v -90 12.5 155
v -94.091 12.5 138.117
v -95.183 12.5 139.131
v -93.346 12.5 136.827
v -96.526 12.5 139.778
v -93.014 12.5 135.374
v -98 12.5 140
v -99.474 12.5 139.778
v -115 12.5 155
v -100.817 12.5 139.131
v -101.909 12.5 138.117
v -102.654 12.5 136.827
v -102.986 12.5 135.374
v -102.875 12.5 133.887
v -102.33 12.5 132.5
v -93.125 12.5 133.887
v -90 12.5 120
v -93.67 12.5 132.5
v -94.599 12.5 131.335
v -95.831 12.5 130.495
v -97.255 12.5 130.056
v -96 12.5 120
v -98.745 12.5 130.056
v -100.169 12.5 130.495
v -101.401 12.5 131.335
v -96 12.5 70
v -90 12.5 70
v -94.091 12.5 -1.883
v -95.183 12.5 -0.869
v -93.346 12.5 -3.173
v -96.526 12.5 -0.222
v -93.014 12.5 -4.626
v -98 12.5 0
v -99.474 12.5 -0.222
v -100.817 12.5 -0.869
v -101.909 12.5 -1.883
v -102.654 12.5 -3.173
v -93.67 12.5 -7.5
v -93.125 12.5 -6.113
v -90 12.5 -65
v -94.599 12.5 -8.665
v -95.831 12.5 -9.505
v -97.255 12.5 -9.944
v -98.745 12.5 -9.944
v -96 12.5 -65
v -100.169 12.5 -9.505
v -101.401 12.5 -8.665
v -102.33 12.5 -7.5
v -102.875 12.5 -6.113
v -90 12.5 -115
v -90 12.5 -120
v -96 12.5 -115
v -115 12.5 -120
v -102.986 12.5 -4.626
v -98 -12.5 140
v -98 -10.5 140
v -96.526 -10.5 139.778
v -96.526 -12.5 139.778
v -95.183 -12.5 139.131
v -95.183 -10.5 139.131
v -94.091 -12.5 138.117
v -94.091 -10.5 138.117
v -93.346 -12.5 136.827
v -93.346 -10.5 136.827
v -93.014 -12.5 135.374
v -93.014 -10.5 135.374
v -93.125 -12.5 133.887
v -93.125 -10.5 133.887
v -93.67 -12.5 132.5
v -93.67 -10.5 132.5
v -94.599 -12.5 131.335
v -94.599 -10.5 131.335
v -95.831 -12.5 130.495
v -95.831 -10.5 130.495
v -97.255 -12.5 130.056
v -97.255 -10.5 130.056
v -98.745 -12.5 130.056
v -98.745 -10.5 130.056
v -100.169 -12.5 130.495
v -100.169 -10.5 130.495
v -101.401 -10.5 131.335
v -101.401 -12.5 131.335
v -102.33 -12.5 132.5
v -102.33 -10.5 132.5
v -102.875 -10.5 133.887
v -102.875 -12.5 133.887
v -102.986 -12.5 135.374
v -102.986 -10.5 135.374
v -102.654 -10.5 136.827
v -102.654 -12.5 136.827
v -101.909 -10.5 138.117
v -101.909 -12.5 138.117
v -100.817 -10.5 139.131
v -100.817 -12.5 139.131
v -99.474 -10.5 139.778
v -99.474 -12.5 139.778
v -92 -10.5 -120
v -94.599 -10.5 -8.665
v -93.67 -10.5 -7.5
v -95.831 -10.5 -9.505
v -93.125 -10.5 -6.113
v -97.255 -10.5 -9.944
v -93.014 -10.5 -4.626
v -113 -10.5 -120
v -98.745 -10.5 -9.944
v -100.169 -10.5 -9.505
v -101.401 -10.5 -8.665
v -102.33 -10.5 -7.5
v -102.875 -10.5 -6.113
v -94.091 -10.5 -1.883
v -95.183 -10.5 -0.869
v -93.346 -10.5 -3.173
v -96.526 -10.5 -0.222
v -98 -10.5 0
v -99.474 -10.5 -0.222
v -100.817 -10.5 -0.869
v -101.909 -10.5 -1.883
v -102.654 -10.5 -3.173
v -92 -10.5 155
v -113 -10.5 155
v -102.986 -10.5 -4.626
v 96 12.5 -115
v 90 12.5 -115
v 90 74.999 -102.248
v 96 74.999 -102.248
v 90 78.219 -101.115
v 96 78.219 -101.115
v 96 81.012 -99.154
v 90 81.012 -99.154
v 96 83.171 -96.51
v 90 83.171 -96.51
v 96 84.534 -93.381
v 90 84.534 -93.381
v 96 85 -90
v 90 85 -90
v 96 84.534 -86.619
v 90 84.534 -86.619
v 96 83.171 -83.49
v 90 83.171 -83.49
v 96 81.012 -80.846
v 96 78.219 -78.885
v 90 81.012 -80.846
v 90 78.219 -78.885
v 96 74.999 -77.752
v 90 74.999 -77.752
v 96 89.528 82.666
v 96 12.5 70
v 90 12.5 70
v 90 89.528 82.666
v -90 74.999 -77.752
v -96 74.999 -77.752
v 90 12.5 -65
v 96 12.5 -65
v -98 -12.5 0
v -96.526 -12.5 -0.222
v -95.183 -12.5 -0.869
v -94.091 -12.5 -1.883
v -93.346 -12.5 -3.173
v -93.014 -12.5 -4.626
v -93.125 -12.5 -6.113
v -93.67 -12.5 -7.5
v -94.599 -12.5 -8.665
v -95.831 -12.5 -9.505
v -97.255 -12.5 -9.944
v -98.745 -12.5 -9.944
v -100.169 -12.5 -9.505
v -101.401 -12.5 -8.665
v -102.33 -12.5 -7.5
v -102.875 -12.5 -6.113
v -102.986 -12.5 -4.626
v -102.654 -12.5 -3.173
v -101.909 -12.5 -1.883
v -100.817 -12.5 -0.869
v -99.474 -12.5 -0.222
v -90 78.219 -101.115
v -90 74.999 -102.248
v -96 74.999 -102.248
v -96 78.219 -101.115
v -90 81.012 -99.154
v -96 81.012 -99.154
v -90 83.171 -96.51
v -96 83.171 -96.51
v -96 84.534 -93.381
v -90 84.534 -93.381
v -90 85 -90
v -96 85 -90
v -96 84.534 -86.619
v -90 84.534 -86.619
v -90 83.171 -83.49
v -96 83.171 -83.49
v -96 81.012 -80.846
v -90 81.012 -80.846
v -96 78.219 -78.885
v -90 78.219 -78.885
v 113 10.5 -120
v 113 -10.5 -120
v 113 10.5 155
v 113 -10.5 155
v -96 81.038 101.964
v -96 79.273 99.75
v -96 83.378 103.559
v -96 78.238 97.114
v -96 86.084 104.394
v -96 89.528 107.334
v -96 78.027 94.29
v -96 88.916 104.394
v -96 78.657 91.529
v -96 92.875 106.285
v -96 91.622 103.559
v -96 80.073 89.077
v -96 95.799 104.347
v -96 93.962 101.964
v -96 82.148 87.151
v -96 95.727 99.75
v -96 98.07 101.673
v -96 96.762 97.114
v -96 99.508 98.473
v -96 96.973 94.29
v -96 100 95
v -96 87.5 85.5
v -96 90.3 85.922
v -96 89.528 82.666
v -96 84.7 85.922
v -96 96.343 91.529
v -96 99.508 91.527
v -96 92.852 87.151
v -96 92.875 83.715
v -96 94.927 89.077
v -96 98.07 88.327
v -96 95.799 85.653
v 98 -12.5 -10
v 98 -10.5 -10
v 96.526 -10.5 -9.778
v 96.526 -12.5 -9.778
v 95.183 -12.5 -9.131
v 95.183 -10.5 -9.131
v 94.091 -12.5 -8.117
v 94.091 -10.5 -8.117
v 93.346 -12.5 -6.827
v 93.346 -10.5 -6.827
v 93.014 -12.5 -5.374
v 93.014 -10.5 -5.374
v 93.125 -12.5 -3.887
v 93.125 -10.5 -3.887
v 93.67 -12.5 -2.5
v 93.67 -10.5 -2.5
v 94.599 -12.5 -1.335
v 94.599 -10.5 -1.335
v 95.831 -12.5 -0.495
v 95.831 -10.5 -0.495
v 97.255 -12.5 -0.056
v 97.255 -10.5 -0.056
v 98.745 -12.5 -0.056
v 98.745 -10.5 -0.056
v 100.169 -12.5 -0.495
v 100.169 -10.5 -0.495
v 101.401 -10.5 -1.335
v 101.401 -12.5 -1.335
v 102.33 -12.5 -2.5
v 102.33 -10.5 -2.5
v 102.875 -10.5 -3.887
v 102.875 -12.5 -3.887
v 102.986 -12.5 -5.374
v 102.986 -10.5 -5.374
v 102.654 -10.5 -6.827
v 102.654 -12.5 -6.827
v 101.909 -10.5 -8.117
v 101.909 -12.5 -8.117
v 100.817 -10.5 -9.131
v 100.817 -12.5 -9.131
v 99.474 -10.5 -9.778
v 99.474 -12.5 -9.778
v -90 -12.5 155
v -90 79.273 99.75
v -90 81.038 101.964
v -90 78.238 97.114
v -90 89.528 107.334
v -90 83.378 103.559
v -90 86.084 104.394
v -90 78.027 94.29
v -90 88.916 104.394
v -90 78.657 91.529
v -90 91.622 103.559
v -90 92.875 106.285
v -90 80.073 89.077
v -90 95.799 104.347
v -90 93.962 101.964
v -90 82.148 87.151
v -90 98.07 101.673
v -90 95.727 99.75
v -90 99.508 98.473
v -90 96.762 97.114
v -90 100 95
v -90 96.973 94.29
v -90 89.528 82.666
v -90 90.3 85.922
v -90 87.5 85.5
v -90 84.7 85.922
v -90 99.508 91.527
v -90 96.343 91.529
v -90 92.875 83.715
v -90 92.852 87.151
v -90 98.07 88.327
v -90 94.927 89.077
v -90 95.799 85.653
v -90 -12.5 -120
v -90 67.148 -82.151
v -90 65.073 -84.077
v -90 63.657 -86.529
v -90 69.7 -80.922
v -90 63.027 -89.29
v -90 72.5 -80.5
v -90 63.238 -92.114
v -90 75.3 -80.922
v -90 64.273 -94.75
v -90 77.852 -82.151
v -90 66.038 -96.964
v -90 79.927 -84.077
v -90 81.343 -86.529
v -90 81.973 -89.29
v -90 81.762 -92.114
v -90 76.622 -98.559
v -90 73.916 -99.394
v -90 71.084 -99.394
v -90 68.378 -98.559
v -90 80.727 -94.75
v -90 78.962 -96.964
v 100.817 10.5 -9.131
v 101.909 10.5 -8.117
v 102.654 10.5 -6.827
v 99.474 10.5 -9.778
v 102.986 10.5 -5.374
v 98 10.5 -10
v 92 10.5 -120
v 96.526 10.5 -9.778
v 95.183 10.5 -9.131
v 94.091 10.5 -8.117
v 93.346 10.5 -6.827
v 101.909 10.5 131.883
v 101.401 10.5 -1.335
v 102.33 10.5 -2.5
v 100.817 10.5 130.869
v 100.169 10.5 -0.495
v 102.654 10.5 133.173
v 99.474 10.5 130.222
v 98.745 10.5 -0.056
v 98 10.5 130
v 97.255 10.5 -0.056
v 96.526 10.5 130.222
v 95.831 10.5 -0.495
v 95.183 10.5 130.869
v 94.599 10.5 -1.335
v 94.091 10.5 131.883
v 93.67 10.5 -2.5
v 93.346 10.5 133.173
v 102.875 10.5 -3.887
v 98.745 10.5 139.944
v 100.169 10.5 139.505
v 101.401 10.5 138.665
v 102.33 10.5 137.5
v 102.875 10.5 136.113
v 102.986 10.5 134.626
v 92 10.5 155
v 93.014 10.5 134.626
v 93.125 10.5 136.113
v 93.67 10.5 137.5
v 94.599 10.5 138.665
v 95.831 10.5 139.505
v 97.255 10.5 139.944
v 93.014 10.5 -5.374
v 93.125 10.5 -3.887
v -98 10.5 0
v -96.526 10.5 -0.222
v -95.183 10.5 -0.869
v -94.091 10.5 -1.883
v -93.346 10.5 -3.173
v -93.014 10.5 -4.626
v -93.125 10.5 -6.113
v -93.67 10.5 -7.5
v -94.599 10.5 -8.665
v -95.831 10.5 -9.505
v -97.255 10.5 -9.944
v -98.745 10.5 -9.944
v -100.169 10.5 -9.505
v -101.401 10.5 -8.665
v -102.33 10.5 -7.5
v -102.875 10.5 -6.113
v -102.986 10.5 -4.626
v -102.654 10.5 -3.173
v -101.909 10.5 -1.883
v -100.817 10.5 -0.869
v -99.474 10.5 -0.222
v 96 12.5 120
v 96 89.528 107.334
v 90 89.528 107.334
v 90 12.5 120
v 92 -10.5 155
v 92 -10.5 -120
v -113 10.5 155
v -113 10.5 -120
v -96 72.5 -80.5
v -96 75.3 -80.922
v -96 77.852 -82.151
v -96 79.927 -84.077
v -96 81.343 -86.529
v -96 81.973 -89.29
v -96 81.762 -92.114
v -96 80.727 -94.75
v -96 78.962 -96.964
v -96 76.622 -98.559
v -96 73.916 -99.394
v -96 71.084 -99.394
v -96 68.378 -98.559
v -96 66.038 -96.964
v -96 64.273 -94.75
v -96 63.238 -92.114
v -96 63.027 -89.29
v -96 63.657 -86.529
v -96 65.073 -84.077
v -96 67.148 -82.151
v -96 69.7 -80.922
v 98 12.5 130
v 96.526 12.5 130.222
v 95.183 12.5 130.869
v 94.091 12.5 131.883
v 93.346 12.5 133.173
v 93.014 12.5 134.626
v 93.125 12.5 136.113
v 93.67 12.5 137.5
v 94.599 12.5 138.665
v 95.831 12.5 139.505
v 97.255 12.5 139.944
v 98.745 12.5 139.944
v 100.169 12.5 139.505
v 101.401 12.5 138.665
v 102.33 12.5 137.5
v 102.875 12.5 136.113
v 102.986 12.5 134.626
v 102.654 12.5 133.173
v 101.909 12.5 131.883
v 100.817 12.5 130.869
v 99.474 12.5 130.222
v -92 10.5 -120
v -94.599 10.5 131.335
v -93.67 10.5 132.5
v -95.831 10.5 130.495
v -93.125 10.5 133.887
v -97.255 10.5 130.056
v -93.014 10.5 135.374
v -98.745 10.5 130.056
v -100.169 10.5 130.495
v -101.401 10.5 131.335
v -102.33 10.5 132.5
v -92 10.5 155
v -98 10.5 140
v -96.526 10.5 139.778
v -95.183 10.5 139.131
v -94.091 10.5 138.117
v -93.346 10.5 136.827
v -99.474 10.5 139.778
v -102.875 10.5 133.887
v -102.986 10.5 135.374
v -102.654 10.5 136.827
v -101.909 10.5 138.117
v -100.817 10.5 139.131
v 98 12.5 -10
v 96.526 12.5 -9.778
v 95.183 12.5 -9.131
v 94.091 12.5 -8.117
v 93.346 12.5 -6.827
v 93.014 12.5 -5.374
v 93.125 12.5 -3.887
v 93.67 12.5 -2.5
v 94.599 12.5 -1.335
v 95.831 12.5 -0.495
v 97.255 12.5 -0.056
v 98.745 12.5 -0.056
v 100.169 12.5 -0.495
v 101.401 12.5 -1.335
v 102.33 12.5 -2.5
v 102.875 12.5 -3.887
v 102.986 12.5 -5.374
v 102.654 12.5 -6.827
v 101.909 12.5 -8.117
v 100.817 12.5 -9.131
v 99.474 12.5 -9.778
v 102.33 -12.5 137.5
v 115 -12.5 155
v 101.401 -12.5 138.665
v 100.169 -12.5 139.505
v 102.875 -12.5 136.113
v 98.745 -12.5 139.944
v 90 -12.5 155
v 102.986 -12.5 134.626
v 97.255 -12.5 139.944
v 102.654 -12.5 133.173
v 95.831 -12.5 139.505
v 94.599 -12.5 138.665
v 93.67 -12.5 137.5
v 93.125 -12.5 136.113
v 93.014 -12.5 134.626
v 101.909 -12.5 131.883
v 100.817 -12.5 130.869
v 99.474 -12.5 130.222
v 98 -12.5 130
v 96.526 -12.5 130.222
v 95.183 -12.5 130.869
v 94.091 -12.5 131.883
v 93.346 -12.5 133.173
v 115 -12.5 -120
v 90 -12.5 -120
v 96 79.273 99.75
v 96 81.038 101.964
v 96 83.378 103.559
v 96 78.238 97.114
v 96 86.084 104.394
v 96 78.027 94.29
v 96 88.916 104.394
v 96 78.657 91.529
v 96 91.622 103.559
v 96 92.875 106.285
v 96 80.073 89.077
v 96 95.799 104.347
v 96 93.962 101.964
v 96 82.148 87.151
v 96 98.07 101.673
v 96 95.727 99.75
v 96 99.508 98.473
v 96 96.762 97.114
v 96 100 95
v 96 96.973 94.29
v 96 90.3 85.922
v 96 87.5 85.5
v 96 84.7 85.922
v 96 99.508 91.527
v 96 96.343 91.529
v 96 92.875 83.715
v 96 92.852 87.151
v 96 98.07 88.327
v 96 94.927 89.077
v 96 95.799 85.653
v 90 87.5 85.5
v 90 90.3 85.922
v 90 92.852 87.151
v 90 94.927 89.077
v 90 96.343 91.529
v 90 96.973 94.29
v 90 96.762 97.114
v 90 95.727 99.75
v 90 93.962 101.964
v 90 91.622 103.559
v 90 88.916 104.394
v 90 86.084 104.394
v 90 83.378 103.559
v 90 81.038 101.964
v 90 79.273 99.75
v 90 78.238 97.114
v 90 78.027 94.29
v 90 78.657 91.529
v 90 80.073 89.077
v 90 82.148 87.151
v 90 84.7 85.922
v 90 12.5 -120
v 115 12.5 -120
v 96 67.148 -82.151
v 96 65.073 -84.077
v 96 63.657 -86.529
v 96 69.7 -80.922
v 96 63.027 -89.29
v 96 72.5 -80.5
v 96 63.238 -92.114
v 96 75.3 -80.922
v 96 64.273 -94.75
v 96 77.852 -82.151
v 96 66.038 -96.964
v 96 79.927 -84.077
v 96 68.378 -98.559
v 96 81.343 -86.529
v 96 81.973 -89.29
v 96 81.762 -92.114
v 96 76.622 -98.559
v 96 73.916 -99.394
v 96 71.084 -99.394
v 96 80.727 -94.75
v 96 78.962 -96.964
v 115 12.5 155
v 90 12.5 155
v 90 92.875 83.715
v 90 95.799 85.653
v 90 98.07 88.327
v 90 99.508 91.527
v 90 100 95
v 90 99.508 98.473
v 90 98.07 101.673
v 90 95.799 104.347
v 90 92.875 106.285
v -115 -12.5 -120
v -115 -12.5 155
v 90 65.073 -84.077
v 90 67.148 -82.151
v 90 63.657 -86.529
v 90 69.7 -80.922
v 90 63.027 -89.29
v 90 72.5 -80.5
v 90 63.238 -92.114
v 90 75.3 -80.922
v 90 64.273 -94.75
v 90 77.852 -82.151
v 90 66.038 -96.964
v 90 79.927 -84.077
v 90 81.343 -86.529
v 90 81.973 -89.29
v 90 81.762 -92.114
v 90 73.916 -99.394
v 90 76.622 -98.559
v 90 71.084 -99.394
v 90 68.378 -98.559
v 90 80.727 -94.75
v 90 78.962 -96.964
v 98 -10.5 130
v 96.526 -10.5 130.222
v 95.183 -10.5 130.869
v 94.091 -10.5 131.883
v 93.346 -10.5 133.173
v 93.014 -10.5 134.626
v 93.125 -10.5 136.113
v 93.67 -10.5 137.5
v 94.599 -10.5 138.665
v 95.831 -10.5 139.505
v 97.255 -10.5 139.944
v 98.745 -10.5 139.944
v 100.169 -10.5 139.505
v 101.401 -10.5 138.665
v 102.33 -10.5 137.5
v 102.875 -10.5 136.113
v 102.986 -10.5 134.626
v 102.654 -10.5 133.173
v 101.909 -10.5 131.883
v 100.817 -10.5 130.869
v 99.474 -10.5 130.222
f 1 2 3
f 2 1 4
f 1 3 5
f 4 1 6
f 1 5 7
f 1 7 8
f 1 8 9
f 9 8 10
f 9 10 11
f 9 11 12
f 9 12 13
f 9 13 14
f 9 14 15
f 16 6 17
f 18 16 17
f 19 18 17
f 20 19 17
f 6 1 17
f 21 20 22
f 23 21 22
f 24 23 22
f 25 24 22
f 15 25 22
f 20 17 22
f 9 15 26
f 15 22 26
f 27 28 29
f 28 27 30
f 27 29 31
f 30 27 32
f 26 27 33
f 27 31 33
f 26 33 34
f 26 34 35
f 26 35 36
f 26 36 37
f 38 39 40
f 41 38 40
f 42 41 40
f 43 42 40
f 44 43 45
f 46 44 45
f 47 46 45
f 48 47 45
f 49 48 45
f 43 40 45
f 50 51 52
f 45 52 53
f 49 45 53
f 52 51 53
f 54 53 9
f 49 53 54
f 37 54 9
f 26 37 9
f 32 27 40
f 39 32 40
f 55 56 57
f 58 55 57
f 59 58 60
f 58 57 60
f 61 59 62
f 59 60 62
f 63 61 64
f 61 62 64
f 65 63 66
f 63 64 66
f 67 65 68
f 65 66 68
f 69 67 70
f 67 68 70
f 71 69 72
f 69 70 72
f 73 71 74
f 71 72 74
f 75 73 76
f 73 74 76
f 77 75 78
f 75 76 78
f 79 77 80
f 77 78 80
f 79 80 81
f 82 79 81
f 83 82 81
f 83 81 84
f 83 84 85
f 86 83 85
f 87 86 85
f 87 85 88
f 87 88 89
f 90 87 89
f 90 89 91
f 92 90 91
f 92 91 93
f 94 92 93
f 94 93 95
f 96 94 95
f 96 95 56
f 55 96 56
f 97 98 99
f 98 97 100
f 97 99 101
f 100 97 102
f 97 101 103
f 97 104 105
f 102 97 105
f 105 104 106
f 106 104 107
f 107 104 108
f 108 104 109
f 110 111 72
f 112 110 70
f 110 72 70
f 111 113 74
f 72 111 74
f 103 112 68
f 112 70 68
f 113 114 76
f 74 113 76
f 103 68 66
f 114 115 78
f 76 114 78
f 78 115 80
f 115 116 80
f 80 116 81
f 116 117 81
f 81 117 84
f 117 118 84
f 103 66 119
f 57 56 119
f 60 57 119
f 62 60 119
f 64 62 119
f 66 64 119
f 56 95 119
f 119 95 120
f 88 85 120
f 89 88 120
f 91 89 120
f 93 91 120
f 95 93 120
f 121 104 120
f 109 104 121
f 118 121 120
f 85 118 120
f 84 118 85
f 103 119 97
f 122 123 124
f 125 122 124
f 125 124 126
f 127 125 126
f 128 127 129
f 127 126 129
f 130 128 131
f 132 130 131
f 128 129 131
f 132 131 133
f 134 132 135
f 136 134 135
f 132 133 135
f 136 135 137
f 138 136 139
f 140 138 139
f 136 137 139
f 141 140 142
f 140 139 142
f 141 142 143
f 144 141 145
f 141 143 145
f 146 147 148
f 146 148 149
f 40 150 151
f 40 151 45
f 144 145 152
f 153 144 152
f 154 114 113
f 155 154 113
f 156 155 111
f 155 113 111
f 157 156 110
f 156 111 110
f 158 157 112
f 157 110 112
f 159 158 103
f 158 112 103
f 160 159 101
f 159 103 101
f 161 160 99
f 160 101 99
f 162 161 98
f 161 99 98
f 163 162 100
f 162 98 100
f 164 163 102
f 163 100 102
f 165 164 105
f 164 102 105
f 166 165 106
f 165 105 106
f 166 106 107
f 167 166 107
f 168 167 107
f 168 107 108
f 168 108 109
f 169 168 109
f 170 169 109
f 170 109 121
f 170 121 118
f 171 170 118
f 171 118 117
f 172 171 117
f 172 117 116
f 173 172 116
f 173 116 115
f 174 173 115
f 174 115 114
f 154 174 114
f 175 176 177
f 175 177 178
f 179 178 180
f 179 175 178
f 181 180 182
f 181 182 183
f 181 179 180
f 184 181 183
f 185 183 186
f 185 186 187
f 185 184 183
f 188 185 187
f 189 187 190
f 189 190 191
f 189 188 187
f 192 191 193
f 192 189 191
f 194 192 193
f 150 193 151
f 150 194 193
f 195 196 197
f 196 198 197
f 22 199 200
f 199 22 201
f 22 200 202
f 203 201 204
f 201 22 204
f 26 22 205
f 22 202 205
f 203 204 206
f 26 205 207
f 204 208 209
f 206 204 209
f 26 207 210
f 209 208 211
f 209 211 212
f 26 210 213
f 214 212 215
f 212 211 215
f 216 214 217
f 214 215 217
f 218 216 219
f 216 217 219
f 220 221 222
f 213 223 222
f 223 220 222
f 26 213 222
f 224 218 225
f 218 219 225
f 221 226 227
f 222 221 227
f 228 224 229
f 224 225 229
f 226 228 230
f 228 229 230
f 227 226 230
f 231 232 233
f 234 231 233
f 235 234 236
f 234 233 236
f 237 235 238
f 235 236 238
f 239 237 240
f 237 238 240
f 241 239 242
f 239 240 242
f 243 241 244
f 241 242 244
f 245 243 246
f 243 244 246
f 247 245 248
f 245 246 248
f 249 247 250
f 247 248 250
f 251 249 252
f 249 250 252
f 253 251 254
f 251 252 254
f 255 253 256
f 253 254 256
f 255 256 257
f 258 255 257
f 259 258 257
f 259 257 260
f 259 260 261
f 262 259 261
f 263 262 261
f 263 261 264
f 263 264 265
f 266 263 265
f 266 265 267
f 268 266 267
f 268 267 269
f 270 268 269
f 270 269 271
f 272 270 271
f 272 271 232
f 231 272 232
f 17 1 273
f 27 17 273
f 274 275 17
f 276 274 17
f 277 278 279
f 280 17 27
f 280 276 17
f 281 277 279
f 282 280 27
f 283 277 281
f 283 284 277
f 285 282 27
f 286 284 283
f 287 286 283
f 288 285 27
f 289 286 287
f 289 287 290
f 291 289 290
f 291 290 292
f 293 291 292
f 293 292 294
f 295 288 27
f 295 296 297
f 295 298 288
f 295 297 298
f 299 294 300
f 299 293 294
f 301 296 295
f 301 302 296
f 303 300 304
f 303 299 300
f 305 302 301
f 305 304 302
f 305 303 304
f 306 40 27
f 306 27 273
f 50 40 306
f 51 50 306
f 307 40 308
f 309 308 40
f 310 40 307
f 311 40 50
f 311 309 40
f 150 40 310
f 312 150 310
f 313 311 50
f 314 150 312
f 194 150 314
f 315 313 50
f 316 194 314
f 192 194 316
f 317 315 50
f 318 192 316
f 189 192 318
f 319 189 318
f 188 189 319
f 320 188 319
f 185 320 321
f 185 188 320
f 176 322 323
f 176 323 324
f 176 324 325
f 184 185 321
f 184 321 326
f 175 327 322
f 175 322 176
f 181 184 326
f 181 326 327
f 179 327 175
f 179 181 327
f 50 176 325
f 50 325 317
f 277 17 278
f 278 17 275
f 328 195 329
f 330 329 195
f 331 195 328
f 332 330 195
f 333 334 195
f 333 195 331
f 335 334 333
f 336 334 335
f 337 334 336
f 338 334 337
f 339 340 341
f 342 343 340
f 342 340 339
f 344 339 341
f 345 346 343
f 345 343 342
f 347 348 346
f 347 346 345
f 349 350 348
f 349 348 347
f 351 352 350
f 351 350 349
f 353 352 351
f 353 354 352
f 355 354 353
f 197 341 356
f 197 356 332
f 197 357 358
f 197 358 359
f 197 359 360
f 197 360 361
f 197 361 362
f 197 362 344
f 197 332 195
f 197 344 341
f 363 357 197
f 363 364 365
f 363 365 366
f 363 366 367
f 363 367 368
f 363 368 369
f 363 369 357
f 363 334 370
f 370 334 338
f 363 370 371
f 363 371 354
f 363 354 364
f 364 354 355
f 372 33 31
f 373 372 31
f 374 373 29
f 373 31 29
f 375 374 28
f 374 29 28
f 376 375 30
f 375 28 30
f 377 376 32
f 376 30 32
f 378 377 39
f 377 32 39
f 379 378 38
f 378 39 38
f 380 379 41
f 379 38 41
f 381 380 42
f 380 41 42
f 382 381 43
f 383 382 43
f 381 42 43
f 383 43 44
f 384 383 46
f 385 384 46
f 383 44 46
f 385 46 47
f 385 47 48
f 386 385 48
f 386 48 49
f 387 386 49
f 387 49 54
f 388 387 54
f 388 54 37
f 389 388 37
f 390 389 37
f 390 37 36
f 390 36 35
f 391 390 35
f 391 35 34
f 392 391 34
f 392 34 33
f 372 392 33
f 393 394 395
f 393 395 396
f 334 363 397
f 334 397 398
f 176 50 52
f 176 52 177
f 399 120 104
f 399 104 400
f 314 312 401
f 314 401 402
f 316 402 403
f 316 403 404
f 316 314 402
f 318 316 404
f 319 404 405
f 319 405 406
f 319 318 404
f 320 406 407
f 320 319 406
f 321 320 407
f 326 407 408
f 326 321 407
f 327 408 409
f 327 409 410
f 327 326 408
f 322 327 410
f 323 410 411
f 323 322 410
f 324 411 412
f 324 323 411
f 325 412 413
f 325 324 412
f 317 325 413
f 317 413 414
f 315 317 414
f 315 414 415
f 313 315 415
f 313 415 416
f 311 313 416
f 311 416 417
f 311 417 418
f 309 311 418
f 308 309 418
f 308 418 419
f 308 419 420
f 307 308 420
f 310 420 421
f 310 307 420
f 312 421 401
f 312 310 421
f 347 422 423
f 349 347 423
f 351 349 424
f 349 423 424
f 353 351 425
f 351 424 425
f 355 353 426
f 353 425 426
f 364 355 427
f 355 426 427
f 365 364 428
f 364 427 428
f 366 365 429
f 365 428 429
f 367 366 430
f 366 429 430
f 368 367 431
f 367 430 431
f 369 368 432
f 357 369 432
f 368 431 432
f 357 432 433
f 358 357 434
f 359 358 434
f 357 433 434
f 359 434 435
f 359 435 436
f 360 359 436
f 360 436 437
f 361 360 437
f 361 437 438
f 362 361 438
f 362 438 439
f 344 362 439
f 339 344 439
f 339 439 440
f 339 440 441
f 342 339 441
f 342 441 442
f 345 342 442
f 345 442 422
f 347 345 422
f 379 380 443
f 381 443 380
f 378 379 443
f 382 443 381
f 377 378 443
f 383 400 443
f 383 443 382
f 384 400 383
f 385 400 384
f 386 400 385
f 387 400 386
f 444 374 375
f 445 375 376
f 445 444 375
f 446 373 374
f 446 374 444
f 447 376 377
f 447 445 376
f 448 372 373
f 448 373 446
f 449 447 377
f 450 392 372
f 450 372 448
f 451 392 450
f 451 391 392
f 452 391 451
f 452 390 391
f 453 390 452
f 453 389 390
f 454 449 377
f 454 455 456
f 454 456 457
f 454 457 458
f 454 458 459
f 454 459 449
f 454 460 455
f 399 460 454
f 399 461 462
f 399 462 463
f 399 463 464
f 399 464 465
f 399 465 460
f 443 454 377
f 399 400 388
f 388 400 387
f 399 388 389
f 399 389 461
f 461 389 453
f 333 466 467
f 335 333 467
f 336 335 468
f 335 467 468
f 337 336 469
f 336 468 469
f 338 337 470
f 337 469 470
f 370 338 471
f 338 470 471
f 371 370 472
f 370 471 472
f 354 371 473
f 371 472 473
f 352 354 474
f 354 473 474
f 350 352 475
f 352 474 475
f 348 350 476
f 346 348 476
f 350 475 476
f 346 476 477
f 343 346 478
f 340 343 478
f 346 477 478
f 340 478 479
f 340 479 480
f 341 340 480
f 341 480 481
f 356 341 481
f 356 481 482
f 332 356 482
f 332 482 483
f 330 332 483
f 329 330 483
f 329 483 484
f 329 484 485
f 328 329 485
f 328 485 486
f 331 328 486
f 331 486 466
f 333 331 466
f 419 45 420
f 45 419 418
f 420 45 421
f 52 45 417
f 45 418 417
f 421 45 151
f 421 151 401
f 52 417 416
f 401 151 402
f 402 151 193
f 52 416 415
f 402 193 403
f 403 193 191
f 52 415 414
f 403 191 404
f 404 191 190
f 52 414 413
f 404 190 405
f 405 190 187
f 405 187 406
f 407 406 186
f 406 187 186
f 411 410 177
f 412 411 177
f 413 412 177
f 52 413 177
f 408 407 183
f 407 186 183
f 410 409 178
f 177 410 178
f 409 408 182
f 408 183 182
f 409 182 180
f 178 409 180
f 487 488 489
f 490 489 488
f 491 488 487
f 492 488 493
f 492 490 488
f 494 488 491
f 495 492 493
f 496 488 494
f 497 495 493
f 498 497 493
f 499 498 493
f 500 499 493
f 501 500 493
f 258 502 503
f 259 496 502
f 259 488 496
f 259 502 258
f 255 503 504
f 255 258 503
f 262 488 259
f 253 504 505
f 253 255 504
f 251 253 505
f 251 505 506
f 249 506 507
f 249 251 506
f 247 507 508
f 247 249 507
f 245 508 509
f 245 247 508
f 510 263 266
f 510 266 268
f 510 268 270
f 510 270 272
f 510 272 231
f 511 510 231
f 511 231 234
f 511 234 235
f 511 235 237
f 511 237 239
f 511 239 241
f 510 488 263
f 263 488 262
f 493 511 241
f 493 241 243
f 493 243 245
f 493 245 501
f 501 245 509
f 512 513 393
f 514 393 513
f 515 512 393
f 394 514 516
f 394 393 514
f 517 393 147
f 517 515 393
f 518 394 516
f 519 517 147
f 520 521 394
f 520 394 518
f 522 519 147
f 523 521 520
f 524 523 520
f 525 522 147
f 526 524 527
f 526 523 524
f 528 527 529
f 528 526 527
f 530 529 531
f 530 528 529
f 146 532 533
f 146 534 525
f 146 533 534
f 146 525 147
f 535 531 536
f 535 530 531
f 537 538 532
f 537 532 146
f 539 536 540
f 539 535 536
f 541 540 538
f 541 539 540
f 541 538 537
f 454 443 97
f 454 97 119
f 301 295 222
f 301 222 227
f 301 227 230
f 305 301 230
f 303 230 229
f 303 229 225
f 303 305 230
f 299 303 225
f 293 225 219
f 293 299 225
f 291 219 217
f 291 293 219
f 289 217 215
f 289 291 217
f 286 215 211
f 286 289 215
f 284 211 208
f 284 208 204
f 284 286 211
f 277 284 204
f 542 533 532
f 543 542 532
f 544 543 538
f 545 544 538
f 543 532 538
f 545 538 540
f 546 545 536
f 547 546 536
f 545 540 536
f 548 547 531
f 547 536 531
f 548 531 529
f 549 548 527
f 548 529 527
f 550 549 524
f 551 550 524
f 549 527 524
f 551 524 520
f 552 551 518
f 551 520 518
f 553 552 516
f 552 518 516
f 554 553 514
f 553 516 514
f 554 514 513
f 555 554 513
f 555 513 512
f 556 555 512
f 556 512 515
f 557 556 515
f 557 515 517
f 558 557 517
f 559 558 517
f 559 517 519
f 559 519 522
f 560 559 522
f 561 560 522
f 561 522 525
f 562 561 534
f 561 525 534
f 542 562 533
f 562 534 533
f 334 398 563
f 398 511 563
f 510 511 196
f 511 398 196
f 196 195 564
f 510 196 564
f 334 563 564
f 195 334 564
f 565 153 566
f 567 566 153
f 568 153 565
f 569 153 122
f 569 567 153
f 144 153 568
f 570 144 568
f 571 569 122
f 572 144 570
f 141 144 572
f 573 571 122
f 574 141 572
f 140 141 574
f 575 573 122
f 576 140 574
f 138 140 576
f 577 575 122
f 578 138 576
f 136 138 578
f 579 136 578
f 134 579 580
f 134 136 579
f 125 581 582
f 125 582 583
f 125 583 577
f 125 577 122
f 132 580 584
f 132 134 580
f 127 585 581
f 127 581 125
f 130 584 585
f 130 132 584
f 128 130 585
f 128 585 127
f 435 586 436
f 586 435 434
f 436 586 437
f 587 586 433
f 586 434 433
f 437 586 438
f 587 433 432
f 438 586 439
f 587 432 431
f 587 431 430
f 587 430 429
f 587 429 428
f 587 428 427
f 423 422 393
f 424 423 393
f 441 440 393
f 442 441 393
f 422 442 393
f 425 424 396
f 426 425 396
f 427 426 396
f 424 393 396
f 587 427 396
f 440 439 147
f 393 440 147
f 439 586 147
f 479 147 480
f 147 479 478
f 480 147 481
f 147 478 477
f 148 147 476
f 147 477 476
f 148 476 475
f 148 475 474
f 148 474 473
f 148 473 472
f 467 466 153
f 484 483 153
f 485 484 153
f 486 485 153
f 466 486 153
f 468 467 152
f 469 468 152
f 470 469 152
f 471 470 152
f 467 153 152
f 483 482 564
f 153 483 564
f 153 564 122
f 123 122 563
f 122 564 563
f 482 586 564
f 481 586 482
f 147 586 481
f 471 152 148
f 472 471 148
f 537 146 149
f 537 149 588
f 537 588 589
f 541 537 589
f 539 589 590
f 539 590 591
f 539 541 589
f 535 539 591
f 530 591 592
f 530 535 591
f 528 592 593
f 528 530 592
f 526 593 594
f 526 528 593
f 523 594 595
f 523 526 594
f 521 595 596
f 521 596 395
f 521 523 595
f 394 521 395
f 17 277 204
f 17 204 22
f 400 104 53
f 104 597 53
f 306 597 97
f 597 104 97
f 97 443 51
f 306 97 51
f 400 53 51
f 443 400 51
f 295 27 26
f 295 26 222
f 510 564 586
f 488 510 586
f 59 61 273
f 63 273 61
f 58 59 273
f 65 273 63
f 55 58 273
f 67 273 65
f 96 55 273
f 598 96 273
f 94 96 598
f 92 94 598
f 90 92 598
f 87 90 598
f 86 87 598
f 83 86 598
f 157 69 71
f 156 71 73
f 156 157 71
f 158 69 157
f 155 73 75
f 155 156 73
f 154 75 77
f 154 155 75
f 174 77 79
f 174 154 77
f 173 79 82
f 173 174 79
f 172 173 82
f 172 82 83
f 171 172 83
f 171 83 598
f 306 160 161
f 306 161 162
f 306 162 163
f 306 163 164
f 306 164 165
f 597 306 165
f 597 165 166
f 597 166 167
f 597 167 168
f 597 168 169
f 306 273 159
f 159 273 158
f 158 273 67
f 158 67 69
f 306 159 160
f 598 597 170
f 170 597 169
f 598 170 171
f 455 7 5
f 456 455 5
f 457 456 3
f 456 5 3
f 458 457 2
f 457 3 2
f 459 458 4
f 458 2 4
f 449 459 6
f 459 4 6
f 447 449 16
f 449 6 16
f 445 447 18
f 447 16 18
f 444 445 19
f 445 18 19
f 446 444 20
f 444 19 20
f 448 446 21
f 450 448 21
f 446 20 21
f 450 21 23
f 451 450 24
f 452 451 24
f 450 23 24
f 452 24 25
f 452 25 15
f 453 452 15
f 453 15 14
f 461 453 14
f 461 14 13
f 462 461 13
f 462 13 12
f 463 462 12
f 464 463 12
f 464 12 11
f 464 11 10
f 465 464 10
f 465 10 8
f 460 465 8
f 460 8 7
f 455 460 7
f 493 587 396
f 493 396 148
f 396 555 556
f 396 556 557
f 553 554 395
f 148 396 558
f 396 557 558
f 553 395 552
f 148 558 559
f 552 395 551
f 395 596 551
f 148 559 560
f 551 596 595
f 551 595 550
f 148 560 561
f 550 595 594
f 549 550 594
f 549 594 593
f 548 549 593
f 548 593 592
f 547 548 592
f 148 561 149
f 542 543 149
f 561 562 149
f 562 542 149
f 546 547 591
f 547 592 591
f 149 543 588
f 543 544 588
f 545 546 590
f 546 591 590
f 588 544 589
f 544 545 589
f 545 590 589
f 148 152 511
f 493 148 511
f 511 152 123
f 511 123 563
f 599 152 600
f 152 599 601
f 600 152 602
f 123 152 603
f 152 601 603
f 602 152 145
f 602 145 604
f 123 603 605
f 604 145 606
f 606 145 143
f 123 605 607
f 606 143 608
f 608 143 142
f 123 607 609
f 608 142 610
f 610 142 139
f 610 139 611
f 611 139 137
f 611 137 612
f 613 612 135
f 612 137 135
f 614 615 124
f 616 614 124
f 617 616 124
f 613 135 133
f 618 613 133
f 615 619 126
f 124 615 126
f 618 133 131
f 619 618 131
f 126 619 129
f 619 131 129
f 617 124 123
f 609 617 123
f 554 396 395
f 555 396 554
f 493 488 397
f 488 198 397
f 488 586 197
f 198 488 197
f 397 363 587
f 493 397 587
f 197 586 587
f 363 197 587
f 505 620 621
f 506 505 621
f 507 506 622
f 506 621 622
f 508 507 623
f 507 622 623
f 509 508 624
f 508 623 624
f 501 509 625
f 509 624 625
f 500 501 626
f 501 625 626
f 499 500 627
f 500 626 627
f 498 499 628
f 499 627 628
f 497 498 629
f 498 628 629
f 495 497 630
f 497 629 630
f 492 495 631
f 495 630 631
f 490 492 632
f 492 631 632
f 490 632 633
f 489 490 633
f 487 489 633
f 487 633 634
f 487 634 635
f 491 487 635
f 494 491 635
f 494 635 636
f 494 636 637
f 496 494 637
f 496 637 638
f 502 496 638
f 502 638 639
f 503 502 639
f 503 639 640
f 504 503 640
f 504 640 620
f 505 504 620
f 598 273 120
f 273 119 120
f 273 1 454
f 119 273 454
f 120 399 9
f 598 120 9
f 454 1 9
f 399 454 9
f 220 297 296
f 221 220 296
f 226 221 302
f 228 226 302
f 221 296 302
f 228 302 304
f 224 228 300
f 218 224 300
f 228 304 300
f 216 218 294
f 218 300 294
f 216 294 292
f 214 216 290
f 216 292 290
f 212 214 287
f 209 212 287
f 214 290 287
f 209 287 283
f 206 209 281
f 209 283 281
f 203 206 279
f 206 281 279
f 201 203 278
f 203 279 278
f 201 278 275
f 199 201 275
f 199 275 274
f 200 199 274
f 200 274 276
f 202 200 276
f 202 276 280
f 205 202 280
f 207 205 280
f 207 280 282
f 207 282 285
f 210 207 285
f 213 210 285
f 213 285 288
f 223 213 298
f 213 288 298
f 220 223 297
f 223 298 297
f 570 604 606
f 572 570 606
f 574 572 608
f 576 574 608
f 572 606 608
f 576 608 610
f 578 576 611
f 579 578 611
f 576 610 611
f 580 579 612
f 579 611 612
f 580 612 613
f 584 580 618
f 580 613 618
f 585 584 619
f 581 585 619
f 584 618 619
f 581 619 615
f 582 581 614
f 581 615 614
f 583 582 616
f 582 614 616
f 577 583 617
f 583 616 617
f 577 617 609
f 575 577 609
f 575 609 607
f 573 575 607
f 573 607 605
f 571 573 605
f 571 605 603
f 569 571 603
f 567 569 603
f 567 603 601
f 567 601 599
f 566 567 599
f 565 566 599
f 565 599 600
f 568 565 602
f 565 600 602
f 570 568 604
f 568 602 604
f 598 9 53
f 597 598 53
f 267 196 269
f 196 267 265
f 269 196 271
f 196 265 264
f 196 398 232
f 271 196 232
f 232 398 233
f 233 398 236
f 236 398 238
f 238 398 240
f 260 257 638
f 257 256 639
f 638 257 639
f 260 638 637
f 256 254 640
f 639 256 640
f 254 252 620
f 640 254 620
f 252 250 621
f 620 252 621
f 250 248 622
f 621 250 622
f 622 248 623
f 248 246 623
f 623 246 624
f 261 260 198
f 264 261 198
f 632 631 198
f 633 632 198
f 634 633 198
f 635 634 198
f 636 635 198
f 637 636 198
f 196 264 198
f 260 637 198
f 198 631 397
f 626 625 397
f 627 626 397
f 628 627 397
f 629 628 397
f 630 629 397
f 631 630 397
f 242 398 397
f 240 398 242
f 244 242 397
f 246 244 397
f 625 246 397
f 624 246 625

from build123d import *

# Parameters (mm, degrees)
BOSS_EXTRUDE1_DEPTH = 12.5
SHELL1_START        = -113
SHELL1_OUTLINE_W    = 21
SHELL1_OUTLINE_H    = 306
SHELL1_DEPTH        = 21
SHELL1_START_2      = 92
SHELL1_2_OUTLINE_W  = 21
SHELL1_2_OUTLINE_H  = 306
SHELL1_2_DEPTH      = 21
SHELL1_START_3      = -92
SHELL1_3_OUTLINE_W  = 21
SHELL1_3_OUTLINE_H  = 21
SHELL1_3_DEPTH      = 184
SKETCH6_R           = 9.5
BOSS_EXTRUDE5_DEPTH = 6
LPATTERN1_COUNT     = 2
LPATTERN1_PITCH     = 186
SKETCH9_R           = 9.5
BOSS_EXTRUDE6_DEPTH = 6
SKETCH10_W          = 180
SKETCH10_H          = 25
CUT_EXTRUDE1_DEPTH  = 212.910948278
SKETCH11_R          = 5
CUT_EXTRUDE2_DEPTH  = 212.910948278
SKETCH12_W          = 230
SKETCH12_H          = 35
CUT_EXTRUDE3_DEPTH  = 212.910948278
SKETCH13_W          = 21
SKETCH13_H          = 21
BOSS_EXTRUDE7_DEPTH = 2
SKETCH14_W          = 21
SKETCH14_H          = 21
BOSS_EXTRUDE8_DEPTH = 2
SKETCH16_W          = 21
SKETCH16_H          = 21
CUT_EXTRUDE5_DEPTH  = 275


# Read off the part's stored shape, not the designer's step: Shell1
with BuildPart() as part:
    # Sketch1 → Boss-Extrude1 (new, symmetric)
    with BuildSketch(Plane(origin=(0, 0, 0), x_dir=(1, 0, 0), z_dir=(0, 1, 0))):
        Polygon((-115, -155), (-115, 155), (-90, 155), (-90, 130), (-90, -130), (90, -130), (90, 130), (90, 155), (115, 155), (115, -155), align=None)
    extrude(amount=BOSS_EXTRUDE1_DEPTH, both=True)

    # Shell1 outline → Shell1 (cut)
    with BuildSketch(Plane.YZ.offset(SHELL1_START)):
        Rectangle(SHELL1_OUTLINE_W, SHELL1_OUTLINE_H)
    extrude(amount=SHELL1_DEPTH, mode=Mode.SUBTRACT)

    # Shell1 2 outline → Shell1 2 (cut)
    with BuildSketch(Plane.YZ.offset(SHELL1_START_2)):
        Rectangle(SHELL1_2_OUTLINE_W, SHELL1_2_OUTLINE_H)
    extrude(amount=SHELL1_2_DEPTH, mode=Mode.SUBTRACT)

    # Shell1 3 outline → Shell1 3 (cut)
    with BuildSketch(Plane.YZ.offset(SHELL1_START_3)):
        with Locations((0, 142.5)):
            Rectangle(SHELL1_3_OUTLINE_W, SHELL1_3_OUTLINE_H)
    extrude(amount=SHELL1_3_DEPTH, mode=Mode.SUBTRACT)

    # Sketch6 → Boss-Extrude5 (add)
    with BuildSketch(Plane(origin=(-90, 0, 0), x_dir=(0, 0, -1), z_dir=(1, 0, 0))):
        with BuildLine():
            Line((-107.334371247, 89.528123749), (-120, 12.5))
            Line((-120, 12.5), (-70, 12.5))
            Line((-70, 12.5), (-82.665628753, 89.528123749))
            ThreePointArc((-82.665628753, 89.528123749), (-95, 100), (-107.334371247, 89.528123749))
        make_face()
        with Locations((-95, 87.5)):
            Circle(SKETCH6_R, mode=Mode.SUBTRACT)
    boss_extrude5 = extrude(amount=-BOSS_EXTRUDE5_DEPTH)

    # LPattern1: Boss-Extrude5 ×2
    with Locations(*[(i * LPATTERN1_PITCH, 0, 0) for i in range(1, LPATTERN1_COUNT)]):
        add(boss_extrude5)

    # Sketch9 → Boss-Extrude6 (add)
    with BuildSketch(Plane.ZY.offset(-90)):
        with BuildLine():
            Line((-77.752351341, 74.999020274), (-65, 12.5))
            Line((-65, 12.5), (-115, 12.5))
            Line((-115, 12.5), (-102.247648659, 74.999020274))
            ThreePointArc((-102.247648659, 74.999020274), (-90, 85), (-77.752351341, 74.999020274))
        make_face()
        with Locations((-90, 72.5)):
            Circle(SKETCH9_R, mode=Mode.SUBTRACT)
    boss_extrude6 = extrude(amount=-BOSS_EXTRUDE6_DEPTH)

    # Mirror1: Boss-Extrude6 across plane
    add(boss_extrude6.mirror(Plane(origin=(0, 0, 0), x_dir=(0, 0, 1), z_dir=(1, 0, 0))))

    # Sketch10 → Cut-Extrude1 (cut, through all)
    with BuildSketch(Plane(origin=(0, 12.5, 0), x_dir=(1, 0, 0), z_dir=(0, 1, 0))):
        with Locations((0, -142.5)):
            Rectangle(SKETCH10_W, SKETCH10_H)
    extrude(amount=-CUT_EXTRUDE1_DEPTH, mode=Mode.SUBTRACT)


with BuildPart() as cut_extrude1_piece_1:
    # of the separate pieces the step leaves, piece 1, a body of its own (cut_extrude1_pieces)
    add(part.part.solids().sort_by_distance((115, -12.5, 155))[0])


with BuildPart() as cut_extrude1_piece_2:
    # of the separate pieces the step leaves, piece 2, a body of its own (cut_extrude1_pieces)
    add(part.part.solids().sort_by_distance((-115, -12.5, 155))[0])


with BuildPart() as cut_extrude2_tool:
    # Sketch11 → Cut-Extrude2 (new, through all)
    with BuildSketch(Plane(origin=(0, 12.5, 0), x_dir=(1, 0, 0), z_dir=(0, 1, 0))):
        with Locations(Location((-98, 5, 0), (0, 0, 270))):
            Circle(SKETCH11_R)
        with Locations(Location((-98, -135, 0), (0, 0, 270))):
            Circle(SKETCH11_R)
        with Locations(Location((98, -135, 0), (0, 0, 90))):
            Circle(SKETCH11_R)
        with Locations(Location((98, 5, 0), (0, 0, 90))):
            Circle(SKETCH11_R)
    extrude(amount=-CUT_EXTRUDE2_DEPTH)


with BuildPart() as cut_extrude1_piece_1_1:
    add(cut_extrude1_piece_1.part)

    # Cut-Extrude2: cut by cut_extrude2_tool
    add(cut_extrude2_tool.part, mode=Mode.SUBTRACT)


with BuildPart() as cut_extrude1_piece_2_1:
    add(cut_extrude1_piece_2.part)

    # Cut-Extrude2: cut by cut_extrude2_tool
    add(cut_extrude2_tool.part, mode=Mode.SUBTRACT)


with BuildPart() as cut_extrude3_tool:
    # Sketch12 → Cut-Extrude3 (new, through all)
    with BuildSketch(Plane(origin=(0, 12.5, 0), x_dir=(1, 0, 0), z_dir=(0, 1, 0))):
        with Locations((0, 137.5)):
            Rectangle(SKETCH12_W, SKETCH12_H)
    extrude(amount=-CUT_EXTRUDE3_DEPTH)


with BuildPart() as cut_extrude1_piece_1_2:
    add(cut_extrude1_piece_1_1.part)

    # Cut-Extrude3: cut by cut_extrude3_tool
    add(cut_extrude3_tool.part, mode=Mode.SUBTRACT)

    # Sketch13 → Boss-Extrude7 (add)
    with BuildSketch(Plane(origin=(92, 0, 0), x_dir=(0, 0, -1), z_dir=(1, 0, 0))):
        with Locations((-142.5, 0)):
            Rectangle(SKETCH13_W, SKETCH13_H)
    extrude(amount=-BOSS_EXTRUDE7_DEPTH)


with BuildPart() as cut_extrude1_piece_2_2:
    add(cut_extrude1_piece_2_1.part)

    # Cut-Extrude3: cut by cut_extrude3_tool
    add(cut_extrude3_tool.part, mode=Mode.SUBTRACT)

    # Sketch14 → Boss-Extrude8 (add)
    with BuildSketch(Plane.ZY.offset(92)):
        with Locations((142.5, 0)):
            Rectangle(SKETCH14_W, SKETCH14_H)
    extrude(amount=-BOSS_EXTRUDE8_DEPTH)


with BuildPart() as cut_extrude5_tool:
    # Sketch16 → Cut-Extrude5 (new body)
    with BuildSketch(Plane(origin=(0, 0, -120), x_dir=(-1, 0, 0), z_dir=(0, 0, -1))):
        with Locations((-102.5, 0)):
            Rectangle(SKETCH16_W, SKETCH16_H)
        with Locations((102.5, 0)):
            Rectangle(SKETCH16_W, SKETCH16_H)
    extrude(amount=-CUT_EXTRUDE5_DEPTH)


with BuildPart() as cut_extrude1_piece_1_3:
    add(cut_extrude1_piece_1_2.part)

    # Cut-Extrude5: cut by cut_extrude5_tool
    add(cut_extrude5_tool.part, mode=Mode.SUBTRACT)


with BuildPart() as cut_extrude1_piece_2_3:
    add(cut_extrude1_piece_2_2.part)

    # Cut-Extrude5: cut by cut_extrude5_tool
    add(cut_extrude5_tool.part, mode=Mode.SUBTRACT)


solid = Compound([cut_extrude1_piece_1_3.part, cut_extrude1_piece_2_3.part])
